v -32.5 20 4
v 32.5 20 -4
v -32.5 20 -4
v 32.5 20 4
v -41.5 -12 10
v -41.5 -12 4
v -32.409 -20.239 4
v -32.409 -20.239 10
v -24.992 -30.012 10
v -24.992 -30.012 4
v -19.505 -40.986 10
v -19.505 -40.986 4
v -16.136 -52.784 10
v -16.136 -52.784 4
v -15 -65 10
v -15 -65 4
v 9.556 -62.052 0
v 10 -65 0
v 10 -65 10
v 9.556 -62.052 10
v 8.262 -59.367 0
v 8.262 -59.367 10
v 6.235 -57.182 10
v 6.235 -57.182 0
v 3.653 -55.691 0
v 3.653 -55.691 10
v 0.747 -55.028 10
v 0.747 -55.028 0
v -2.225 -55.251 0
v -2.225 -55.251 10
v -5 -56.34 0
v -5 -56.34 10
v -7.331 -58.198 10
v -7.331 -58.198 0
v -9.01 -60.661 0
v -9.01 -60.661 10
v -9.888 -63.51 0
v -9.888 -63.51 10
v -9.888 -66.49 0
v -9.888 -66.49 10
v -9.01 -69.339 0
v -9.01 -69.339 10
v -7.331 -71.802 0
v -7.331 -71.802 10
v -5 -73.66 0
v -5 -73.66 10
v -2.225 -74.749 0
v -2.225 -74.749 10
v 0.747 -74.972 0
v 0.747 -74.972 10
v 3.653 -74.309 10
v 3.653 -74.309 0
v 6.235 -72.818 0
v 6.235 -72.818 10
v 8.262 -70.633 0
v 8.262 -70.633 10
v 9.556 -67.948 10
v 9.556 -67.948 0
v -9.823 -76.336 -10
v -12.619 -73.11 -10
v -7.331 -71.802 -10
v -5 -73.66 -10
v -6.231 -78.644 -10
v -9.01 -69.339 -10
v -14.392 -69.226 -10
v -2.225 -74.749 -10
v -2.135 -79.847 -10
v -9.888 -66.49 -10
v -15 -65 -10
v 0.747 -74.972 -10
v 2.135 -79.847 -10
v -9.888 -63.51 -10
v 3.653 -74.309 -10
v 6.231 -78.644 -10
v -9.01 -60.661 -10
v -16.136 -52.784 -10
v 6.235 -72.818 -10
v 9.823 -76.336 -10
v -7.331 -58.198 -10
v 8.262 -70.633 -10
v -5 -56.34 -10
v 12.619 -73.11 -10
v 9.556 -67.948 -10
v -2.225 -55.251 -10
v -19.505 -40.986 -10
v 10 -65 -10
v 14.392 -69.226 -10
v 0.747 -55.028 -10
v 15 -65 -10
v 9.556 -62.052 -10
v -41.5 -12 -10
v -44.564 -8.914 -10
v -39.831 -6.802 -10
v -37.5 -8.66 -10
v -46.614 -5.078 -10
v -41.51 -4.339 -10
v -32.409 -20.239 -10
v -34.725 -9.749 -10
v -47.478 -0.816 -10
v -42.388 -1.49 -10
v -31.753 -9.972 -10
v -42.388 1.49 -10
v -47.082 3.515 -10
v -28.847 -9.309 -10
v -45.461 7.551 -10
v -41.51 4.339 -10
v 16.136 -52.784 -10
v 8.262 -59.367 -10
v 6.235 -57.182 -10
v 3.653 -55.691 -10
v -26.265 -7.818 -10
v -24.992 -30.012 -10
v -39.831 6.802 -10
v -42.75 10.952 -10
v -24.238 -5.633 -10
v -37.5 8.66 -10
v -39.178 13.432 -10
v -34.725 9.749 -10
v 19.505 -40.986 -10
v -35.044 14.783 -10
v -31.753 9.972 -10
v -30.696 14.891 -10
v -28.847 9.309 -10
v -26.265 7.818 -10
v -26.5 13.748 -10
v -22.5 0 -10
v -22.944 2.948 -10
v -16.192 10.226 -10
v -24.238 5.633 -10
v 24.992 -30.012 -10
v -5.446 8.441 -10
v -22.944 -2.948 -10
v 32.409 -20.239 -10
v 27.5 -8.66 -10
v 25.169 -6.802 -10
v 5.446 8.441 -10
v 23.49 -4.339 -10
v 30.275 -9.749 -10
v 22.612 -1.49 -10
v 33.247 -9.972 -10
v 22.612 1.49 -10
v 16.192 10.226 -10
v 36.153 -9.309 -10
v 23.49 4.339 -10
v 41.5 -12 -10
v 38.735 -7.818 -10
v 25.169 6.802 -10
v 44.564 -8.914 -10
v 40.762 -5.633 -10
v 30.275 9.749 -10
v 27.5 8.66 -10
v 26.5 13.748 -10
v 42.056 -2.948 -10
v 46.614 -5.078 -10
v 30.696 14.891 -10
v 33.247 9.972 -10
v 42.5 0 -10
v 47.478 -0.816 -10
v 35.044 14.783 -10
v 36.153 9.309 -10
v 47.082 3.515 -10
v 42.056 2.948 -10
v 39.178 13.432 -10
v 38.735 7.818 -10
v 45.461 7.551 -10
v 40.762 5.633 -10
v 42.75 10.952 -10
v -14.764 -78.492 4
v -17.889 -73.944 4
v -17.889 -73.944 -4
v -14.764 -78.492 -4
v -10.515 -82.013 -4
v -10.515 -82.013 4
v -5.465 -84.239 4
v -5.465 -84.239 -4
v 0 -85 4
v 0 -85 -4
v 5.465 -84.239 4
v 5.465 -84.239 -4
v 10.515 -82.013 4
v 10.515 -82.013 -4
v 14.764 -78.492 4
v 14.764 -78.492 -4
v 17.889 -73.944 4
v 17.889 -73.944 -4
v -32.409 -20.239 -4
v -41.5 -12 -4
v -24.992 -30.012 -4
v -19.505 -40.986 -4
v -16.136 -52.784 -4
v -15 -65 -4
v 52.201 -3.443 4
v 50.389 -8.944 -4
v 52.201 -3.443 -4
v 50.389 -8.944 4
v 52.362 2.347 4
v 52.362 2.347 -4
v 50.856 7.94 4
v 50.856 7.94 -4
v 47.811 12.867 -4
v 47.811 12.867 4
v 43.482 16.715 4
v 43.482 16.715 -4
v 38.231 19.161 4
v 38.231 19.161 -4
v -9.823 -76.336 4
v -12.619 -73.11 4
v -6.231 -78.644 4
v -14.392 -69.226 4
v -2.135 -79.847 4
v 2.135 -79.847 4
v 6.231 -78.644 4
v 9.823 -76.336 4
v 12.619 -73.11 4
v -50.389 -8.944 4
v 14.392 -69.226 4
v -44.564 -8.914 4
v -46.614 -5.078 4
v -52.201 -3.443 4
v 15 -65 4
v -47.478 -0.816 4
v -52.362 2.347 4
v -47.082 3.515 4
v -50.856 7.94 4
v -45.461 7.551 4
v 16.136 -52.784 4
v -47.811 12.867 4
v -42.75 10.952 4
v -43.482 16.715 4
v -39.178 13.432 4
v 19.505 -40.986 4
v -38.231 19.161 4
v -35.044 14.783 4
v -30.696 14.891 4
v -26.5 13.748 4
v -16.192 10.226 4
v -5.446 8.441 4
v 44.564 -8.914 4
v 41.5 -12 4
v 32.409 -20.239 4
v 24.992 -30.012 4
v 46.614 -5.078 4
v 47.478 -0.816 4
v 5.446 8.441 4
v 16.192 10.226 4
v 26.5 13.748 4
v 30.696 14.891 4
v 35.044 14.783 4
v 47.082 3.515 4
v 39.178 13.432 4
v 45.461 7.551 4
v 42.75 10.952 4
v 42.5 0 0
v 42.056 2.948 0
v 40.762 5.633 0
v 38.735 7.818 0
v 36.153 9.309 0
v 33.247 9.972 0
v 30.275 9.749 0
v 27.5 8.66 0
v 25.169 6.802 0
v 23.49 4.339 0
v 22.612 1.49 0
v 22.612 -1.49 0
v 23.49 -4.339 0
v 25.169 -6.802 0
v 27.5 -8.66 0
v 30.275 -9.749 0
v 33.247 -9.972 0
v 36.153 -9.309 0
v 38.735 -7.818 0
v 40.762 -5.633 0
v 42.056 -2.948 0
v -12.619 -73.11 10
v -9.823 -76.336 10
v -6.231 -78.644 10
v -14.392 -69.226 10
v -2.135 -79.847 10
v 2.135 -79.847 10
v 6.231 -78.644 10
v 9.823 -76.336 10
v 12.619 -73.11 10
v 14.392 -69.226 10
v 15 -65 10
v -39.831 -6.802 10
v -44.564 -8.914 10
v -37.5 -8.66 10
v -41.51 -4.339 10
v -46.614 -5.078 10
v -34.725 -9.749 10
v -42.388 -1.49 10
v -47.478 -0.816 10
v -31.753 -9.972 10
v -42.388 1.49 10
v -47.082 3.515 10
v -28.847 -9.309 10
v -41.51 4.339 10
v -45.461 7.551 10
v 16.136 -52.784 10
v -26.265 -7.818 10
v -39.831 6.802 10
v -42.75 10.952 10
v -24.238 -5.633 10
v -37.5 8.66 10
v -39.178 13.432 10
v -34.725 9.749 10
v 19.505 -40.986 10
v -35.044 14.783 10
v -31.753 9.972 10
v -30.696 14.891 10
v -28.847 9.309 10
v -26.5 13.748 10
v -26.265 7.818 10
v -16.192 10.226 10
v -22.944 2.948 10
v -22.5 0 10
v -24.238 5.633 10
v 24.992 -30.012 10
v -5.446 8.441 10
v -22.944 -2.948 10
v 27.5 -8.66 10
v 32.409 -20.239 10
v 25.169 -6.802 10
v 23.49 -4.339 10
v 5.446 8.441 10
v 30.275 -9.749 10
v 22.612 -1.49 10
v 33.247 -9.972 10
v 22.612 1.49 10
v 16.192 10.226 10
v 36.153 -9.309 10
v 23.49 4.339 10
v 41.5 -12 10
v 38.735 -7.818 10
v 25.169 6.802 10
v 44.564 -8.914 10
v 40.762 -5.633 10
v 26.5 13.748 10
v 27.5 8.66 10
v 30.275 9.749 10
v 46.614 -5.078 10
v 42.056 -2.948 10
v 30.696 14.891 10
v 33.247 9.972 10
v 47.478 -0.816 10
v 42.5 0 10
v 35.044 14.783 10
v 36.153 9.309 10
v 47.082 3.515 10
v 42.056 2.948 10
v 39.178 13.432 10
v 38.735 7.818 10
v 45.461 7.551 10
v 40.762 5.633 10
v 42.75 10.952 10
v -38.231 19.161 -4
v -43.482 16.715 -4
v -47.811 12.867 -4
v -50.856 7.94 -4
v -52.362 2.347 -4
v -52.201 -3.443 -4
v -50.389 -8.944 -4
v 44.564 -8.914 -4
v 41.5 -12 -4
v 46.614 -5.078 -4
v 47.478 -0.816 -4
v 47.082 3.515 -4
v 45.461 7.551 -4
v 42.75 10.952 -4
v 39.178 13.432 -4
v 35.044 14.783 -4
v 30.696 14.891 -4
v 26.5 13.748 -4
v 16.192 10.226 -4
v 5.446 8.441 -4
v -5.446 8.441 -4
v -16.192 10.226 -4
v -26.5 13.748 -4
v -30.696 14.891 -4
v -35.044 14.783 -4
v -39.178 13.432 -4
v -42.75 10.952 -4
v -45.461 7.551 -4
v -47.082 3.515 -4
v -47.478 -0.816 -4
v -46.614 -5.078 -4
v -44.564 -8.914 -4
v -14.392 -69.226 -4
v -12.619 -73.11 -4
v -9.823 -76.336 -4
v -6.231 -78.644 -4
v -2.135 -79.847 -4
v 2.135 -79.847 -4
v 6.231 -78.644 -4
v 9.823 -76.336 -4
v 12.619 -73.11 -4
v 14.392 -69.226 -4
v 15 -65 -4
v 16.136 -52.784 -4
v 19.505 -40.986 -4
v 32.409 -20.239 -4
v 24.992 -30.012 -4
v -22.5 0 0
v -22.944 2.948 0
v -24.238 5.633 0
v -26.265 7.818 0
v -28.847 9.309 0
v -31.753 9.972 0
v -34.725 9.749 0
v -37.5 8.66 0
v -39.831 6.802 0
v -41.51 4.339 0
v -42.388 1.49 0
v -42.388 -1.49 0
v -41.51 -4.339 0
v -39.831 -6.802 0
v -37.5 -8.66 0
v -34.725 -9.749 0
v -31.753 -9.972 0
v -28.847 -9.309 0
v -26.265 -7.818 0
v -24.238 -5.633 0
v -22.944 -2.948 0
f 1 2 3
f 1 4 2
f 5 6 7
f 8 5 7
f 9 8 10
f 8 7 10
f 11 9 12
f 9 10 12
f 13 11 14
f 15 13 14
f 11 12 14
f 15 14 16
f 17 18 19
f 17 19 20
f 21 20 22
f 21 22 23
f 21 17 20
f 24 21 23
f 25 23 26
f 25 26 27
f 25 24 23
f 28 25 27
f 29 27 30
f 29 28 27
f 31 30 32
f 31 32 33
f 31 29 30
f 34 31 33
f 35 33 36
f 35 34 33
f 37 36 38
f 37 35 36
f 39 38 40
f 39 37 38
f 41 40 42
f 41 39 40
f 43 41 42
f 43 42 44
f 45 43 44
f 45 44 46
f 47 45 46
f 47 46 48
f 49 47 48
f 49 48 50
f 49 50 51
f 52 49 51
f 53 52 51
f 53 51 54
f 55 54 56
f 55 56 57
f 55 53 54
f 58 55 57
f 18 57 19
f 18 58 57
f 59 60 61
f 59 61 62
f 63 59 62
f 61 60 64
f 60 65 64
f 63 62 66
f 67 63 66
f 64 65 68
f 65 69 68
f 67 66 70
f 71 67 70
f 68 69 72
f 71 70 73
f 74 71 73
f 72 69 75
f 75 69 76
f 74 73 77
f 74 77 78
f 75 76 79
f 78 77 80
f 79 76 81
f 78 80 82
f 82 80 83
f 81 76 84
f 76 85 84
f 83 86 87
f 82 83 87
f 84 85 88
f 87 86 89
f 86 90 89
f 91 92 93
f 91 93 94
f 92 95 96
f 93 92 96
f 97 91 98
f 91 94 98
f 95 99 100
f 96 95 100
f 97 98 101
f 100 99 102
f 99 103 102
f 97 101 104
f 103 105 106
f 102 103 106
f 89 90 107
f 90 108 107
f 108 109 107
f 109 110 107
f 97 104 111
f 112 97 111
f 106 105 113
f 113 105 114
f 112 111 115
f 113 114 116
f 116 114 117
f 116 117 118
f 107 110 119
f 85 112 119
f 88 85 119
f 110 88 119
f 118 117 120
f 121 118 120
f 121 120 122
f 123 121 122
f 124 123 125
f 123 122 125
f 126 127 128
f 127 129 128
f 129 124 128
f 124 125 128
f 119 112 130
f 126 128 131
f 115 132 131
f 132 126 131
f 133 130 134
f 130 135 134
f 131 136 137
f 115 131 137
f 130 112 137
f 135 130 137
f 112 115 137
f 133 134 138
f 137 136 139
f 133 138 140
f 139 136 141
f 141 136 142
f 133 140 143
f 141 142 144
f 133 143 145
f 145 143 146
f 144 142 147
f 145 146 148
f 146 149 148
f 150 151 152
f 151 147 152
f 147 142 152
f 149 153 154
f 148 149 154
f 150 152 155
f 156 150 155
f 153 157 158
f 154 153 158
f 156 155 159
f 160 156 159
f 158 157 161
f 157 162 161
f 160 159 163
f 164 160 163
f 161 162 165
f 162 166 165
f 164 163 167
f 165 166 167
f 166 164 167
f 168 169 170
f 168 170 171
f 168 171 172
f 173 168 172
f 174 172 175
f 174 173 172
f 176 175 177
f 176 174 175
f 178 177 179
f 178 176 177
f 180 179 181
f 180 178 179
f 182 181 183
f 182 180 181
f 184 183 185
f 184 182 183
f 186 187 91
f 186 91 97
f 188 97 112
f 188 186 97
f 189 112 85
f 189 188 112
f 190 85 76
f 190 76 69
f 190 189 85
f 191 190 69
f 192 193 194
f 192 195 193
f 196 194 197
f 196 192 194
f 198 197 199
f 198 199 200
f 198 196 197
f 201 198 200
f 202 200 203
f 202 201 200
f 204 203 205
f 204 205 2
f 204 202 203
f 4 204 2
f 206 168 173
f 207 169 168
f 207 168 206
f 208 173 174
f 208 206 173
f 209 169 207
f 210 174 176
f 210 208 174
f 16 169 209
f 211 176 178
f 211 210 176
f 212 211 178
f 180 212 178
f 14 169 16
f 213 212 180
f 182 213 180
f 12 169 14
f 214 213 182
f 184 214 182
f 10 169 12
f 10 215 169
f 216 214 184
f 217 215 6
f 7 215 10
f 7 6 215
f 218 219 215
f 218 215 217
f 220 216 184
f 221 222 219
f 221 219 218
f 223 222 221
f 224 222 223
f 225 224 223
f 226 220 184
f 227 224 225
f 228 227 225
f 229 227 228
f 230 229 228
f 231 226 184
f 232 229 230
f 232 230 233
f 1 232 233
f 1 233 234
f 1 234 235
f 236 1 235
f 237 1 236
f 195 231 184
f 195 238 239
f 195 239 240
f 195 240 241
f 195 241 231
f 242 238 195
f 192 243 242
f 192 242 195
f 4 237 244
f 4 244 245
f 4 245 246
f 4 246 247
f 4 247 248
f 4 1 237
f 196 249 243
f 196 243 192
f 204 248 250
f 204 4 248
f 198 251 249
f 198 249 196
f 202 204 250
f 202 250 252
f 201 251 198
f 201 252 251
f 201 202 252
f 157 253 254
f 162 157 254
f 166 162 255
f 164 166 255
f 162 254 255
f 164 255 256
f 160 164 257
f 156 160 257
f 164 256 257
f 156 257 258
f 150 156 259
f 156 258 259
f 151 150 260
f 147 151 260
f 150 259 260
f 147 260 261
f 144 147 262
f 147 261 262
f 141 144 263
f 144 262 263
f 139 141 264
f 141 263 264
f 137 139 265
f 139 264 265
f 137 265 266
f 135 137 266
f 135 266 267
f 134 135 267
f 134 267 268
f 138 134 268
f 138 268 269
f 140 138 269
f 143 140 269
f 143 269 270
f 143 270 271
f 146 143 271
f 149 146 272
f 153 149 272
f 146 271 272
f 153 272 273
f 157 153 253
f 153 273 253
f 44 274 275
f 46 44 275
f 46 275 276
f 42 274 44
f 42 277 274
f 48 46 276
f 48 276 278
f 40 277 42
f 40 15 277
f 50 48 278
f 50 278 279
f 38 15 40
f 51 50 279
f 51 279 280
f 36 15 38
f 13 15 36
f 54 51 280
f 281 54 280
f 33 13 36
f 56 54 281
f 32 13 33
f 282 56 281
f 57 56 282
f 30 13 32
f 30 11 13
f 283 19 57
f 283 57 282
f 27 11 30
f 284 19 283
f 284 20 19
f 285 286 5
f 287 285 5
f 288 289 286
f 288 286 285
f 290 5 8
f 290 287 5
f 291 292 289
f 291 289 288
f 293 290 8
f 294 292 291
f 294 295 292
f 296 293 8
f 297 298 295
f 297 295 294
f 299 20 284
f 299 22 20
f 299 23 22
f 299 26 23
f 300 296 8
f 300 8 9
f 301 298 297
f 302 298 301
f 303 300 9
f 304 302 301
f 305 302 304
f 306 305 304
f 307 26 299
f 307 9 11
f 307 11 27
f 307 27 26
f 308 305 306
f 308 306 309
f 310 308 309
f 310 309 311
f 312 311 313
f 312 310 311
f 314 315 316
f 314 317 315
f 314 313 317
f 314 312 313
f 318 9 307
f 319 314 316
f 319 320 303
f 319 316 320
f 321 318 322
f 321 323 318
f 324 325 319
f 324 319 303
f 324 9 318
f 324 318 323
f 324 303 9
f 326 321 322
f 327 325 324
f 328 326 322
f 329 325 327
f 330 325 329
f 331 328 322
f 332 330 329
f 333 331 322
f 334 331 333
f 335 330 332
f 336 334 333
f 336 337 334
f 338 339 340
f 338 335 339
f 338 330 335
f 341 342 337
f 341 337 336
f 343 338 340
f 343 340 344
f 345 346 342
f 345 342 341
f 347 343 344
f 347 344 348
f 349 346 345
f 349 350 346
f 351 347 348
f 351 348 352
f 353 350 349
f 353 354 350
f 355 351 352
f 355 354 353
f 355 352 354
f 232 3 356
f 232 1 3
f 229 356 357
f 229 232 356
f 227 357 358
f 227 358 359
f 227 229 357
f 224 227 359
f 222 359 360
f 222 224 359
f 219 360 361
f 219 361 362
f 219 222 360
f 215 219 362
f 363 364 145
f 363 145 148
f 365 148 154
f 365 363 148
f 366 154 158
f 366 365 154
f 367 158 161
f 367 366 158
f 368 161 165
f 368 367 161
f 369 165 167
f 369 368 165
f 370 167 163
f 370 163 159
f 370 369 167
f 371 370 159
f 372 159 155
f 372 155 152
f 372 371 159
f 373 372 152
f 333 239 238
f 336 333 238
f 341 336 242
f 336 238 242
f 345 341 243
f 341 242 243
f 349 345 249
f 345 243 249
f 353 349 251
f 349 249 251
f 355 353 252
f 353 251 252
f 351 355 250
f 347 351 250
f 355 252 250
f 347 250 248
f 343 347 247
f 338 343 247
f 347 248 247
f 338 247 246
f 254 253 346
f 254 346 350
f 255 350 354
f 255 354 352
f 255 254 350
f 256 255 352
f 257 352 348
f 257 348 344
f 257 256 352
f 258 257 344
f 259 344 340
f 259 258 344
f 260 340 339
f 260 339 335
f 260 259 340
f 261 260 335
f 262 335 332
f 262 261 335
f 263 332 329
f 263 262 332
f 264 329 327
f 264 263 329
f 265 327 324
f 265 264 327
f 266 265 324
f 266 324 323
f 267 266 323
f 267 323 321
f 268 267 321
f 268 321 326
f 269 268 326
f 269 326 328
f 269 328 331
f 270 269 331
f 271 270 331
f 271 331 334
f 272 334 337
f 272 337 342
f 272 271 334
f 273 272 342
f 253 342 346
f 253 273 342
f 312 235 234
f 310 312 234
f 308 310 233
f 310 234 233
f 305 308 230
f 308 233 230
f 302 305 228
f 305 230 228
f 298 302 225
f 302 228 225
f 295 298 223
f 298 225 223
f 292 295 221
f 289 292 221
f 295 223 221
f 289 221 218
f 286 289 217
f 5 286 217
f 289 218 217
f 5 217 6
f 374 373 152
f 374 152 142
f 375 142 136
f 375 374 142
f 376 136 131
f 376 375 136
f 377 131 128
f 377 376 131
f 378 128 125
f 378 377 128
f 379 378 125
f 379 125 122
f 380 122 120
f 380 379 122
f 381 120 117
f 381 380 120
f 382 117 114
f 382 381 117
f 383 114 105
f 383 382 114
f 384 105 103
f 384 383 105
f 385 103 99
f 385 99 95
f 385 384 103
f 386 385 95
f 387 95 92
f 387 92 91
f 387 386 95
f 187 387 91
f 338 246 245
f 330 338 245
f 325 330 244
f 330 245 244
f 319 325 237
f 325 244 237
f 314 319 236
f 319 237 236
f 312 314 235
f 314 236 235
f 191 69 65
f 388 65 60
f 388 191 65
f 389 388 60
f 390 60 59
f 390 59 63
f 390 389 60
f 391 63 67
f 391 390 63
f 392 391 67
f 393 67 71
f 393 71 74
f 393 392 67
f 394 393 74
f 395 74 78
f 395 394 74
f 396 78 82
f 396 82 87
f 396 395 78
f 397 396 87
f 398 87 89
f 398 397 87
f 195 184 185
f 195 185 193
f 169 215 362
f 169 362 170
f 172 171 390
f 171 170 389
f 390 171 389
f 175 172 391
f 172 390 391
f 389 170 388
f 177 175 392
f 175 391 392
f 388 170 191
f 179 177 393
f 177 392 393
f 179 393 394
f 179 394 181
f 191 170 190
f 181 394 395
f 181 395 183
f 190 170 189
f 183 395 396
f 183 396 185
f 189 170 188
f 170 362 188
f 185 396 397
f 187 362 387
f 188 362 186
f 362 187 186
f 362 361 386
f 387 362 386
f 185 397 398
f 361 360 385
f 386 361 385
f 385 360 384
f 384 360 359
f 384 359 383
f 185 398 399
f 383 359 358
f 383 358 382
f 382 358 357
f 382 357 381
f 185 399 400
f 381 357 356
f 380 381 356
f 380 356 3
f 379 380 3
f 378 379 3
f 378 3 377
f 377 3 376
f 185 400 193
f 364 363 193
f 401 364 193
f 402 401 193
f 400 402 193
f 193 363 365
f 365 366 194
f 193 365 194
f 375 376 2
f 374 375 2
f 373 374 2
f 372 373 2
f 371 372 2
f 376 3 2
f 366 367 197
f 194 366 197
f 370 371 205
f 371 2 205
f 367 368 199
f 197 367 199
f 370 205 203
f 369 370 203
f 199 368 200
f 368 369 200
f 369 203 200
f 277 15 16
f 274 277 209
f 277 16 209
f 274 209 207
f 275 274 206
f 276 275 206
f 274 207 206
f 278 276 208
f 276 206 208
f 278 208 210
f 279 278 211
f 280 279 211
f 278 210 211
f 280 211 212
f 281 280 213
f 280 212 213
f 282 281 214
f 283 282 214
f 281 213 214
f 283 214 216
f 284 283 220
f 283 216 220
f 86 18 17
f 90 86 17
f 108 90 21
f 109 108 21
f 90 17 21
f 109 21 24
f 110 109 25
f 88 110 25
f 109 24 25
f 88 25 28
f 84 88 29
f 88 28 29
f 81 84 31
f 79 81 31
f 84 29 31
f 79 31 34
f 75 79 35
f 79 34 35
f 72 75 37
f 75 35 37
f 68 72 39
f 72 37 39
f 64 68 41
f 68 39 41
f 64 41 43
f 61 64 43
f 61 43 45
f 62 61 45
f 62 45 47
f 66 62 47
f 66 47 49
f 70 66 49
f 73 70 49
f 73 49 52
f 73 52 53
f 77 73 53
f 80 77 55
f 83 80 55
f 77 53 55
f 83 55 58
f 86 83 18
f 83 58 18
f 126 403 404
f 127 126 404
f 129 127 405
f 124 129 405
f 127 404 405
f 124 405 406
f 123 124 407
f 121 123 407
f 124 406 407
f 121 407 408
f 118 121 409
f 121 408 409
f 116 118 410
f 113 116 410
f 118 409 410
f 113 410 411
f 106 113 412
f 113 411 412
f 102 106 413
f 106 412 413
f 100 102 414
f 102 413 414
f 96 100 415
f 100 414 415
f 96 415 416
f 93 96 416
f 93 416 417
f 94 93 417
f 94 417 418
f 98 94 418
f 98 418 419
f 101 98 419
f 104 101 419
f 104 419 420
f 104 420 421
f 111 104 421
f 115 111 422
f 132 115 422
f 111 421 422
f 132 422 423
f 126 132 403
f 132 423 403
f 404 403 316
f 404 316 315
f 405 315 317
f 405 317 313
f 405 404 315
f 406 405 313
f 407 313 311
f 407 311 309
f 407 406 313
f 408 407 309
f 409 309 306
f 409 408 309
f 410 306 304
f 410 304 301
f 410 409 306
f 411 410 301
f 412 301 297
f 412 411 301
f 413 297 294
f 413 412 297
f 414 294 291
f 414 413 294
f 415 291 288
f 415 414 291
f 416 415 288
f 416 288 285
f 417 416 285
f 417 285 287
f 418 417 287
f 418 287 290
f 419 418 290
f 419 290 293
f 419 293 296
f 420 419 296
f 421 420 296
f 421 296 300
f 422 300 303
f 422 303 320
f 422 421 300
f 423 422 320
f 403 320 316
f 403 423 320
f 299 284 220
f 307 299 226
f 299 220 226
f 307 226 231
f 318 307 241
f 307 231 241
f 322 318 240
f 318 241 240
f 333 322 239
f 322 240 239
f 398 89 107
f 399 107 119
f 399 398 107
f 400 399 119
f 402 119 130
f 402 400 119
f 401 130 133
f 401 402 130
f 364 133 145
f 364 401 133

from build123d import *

# Parameters (mm, degrees)
SKETCH1_R           = 10
BOSS_EXTRUDE1_DEPTH = 10
BOSS_EXTRUDE3_DEPTH = 4


with BuildPart() as part:
    # Sketch1 → Boss-Extrude1 (new, symmetric)
    with BuildSketch(Plane.XY):
        with BuildLine():
            ThreePointArc((15, -65), (21.994198596, -35.372099298), (41.5, -12))
            ThreePointArc((41.5, -12), (45.460955309, 7.550737546), (26.5, 13.747727085))
            ThreePointArc((26.5, 13.747727085), (0, 8.216855043), (-26.5, 13.747727085))
            ThreePointArc((-26.5, 13.747727085), (-45.460955309, 7.550737546), (-41.5, -12))
            ThreePointArc((-41.5, -12), (-21.994198596, -35.372099298), (-15, -65))
            ThreePointArc((-15, -65), (0, -80), (15, -65))
        make_face()
        with Locations((-32.5, 0)):
            Circle(SKETCH1_R, mode=Mode.SUBTRACT)
        with Locations((32.5, 0)):
            Circle(SKETCH1_R, mode=Mode.SUBTRACT)
        with Locations((0, -65)):
            Circle(SKETCH1_R, mode=Mode.SUBTRACT)
    extrude(amount=BOSS_EXTRUDE1_DEPTH, both=True)

    # Sketch1<4> → Boss-Extrude3 (add, symmetric)
    with BuildSketch(Plane.XY):
        with BuildLine():
            ThreePointArc((-32.5, 20), (-49.513016167, 10.514622242), (-50.38854382, -8.94427191))
            Line((-50.38854382, -8.94427191), (-17.88854382, -73.94427191))
            ThreePointArc((-17.88854382, -73.94427191), (0, -85), (17.88854382, -73.94427191))
            Line((17.88854382, -73.94427191), (50.38854382, -8.94427191))
            ThreePointArc((50.38854382, -8.94427191), (49.513016167, 10.514622242), (32.5, 20))
            Line((32.5, 20), (-32.5, 20))
        make_face()
        with BuildLine():
            ThreePointArc((26.5, 13.747727085), (45.460955309, 7.550737546), (41.5, -12))
            ThreePointArc((41.5, -12), (21.994198596, -35.372099298), (15, -65))
            ThreePointArc((15, -65), (0, -80), (-15, -65))
            ThreePointArc((-15, -65), (-21.994198596, -35.372099298), (-41.5, -12))
            ThreePointArc((-41.5, -12), (-45.460955309, 7.550737546), (-26.5, 13.747727085))
            ThreePointArc((-26.5, 13.747727085), (0, 8.216855043), (26.5, 13.747727085))
        make_face(mode=Mode.SUBTRACT)
    extrude(amount=BOSS_EXTRUDE3_DEPTH, both=True)


solid = part.part
